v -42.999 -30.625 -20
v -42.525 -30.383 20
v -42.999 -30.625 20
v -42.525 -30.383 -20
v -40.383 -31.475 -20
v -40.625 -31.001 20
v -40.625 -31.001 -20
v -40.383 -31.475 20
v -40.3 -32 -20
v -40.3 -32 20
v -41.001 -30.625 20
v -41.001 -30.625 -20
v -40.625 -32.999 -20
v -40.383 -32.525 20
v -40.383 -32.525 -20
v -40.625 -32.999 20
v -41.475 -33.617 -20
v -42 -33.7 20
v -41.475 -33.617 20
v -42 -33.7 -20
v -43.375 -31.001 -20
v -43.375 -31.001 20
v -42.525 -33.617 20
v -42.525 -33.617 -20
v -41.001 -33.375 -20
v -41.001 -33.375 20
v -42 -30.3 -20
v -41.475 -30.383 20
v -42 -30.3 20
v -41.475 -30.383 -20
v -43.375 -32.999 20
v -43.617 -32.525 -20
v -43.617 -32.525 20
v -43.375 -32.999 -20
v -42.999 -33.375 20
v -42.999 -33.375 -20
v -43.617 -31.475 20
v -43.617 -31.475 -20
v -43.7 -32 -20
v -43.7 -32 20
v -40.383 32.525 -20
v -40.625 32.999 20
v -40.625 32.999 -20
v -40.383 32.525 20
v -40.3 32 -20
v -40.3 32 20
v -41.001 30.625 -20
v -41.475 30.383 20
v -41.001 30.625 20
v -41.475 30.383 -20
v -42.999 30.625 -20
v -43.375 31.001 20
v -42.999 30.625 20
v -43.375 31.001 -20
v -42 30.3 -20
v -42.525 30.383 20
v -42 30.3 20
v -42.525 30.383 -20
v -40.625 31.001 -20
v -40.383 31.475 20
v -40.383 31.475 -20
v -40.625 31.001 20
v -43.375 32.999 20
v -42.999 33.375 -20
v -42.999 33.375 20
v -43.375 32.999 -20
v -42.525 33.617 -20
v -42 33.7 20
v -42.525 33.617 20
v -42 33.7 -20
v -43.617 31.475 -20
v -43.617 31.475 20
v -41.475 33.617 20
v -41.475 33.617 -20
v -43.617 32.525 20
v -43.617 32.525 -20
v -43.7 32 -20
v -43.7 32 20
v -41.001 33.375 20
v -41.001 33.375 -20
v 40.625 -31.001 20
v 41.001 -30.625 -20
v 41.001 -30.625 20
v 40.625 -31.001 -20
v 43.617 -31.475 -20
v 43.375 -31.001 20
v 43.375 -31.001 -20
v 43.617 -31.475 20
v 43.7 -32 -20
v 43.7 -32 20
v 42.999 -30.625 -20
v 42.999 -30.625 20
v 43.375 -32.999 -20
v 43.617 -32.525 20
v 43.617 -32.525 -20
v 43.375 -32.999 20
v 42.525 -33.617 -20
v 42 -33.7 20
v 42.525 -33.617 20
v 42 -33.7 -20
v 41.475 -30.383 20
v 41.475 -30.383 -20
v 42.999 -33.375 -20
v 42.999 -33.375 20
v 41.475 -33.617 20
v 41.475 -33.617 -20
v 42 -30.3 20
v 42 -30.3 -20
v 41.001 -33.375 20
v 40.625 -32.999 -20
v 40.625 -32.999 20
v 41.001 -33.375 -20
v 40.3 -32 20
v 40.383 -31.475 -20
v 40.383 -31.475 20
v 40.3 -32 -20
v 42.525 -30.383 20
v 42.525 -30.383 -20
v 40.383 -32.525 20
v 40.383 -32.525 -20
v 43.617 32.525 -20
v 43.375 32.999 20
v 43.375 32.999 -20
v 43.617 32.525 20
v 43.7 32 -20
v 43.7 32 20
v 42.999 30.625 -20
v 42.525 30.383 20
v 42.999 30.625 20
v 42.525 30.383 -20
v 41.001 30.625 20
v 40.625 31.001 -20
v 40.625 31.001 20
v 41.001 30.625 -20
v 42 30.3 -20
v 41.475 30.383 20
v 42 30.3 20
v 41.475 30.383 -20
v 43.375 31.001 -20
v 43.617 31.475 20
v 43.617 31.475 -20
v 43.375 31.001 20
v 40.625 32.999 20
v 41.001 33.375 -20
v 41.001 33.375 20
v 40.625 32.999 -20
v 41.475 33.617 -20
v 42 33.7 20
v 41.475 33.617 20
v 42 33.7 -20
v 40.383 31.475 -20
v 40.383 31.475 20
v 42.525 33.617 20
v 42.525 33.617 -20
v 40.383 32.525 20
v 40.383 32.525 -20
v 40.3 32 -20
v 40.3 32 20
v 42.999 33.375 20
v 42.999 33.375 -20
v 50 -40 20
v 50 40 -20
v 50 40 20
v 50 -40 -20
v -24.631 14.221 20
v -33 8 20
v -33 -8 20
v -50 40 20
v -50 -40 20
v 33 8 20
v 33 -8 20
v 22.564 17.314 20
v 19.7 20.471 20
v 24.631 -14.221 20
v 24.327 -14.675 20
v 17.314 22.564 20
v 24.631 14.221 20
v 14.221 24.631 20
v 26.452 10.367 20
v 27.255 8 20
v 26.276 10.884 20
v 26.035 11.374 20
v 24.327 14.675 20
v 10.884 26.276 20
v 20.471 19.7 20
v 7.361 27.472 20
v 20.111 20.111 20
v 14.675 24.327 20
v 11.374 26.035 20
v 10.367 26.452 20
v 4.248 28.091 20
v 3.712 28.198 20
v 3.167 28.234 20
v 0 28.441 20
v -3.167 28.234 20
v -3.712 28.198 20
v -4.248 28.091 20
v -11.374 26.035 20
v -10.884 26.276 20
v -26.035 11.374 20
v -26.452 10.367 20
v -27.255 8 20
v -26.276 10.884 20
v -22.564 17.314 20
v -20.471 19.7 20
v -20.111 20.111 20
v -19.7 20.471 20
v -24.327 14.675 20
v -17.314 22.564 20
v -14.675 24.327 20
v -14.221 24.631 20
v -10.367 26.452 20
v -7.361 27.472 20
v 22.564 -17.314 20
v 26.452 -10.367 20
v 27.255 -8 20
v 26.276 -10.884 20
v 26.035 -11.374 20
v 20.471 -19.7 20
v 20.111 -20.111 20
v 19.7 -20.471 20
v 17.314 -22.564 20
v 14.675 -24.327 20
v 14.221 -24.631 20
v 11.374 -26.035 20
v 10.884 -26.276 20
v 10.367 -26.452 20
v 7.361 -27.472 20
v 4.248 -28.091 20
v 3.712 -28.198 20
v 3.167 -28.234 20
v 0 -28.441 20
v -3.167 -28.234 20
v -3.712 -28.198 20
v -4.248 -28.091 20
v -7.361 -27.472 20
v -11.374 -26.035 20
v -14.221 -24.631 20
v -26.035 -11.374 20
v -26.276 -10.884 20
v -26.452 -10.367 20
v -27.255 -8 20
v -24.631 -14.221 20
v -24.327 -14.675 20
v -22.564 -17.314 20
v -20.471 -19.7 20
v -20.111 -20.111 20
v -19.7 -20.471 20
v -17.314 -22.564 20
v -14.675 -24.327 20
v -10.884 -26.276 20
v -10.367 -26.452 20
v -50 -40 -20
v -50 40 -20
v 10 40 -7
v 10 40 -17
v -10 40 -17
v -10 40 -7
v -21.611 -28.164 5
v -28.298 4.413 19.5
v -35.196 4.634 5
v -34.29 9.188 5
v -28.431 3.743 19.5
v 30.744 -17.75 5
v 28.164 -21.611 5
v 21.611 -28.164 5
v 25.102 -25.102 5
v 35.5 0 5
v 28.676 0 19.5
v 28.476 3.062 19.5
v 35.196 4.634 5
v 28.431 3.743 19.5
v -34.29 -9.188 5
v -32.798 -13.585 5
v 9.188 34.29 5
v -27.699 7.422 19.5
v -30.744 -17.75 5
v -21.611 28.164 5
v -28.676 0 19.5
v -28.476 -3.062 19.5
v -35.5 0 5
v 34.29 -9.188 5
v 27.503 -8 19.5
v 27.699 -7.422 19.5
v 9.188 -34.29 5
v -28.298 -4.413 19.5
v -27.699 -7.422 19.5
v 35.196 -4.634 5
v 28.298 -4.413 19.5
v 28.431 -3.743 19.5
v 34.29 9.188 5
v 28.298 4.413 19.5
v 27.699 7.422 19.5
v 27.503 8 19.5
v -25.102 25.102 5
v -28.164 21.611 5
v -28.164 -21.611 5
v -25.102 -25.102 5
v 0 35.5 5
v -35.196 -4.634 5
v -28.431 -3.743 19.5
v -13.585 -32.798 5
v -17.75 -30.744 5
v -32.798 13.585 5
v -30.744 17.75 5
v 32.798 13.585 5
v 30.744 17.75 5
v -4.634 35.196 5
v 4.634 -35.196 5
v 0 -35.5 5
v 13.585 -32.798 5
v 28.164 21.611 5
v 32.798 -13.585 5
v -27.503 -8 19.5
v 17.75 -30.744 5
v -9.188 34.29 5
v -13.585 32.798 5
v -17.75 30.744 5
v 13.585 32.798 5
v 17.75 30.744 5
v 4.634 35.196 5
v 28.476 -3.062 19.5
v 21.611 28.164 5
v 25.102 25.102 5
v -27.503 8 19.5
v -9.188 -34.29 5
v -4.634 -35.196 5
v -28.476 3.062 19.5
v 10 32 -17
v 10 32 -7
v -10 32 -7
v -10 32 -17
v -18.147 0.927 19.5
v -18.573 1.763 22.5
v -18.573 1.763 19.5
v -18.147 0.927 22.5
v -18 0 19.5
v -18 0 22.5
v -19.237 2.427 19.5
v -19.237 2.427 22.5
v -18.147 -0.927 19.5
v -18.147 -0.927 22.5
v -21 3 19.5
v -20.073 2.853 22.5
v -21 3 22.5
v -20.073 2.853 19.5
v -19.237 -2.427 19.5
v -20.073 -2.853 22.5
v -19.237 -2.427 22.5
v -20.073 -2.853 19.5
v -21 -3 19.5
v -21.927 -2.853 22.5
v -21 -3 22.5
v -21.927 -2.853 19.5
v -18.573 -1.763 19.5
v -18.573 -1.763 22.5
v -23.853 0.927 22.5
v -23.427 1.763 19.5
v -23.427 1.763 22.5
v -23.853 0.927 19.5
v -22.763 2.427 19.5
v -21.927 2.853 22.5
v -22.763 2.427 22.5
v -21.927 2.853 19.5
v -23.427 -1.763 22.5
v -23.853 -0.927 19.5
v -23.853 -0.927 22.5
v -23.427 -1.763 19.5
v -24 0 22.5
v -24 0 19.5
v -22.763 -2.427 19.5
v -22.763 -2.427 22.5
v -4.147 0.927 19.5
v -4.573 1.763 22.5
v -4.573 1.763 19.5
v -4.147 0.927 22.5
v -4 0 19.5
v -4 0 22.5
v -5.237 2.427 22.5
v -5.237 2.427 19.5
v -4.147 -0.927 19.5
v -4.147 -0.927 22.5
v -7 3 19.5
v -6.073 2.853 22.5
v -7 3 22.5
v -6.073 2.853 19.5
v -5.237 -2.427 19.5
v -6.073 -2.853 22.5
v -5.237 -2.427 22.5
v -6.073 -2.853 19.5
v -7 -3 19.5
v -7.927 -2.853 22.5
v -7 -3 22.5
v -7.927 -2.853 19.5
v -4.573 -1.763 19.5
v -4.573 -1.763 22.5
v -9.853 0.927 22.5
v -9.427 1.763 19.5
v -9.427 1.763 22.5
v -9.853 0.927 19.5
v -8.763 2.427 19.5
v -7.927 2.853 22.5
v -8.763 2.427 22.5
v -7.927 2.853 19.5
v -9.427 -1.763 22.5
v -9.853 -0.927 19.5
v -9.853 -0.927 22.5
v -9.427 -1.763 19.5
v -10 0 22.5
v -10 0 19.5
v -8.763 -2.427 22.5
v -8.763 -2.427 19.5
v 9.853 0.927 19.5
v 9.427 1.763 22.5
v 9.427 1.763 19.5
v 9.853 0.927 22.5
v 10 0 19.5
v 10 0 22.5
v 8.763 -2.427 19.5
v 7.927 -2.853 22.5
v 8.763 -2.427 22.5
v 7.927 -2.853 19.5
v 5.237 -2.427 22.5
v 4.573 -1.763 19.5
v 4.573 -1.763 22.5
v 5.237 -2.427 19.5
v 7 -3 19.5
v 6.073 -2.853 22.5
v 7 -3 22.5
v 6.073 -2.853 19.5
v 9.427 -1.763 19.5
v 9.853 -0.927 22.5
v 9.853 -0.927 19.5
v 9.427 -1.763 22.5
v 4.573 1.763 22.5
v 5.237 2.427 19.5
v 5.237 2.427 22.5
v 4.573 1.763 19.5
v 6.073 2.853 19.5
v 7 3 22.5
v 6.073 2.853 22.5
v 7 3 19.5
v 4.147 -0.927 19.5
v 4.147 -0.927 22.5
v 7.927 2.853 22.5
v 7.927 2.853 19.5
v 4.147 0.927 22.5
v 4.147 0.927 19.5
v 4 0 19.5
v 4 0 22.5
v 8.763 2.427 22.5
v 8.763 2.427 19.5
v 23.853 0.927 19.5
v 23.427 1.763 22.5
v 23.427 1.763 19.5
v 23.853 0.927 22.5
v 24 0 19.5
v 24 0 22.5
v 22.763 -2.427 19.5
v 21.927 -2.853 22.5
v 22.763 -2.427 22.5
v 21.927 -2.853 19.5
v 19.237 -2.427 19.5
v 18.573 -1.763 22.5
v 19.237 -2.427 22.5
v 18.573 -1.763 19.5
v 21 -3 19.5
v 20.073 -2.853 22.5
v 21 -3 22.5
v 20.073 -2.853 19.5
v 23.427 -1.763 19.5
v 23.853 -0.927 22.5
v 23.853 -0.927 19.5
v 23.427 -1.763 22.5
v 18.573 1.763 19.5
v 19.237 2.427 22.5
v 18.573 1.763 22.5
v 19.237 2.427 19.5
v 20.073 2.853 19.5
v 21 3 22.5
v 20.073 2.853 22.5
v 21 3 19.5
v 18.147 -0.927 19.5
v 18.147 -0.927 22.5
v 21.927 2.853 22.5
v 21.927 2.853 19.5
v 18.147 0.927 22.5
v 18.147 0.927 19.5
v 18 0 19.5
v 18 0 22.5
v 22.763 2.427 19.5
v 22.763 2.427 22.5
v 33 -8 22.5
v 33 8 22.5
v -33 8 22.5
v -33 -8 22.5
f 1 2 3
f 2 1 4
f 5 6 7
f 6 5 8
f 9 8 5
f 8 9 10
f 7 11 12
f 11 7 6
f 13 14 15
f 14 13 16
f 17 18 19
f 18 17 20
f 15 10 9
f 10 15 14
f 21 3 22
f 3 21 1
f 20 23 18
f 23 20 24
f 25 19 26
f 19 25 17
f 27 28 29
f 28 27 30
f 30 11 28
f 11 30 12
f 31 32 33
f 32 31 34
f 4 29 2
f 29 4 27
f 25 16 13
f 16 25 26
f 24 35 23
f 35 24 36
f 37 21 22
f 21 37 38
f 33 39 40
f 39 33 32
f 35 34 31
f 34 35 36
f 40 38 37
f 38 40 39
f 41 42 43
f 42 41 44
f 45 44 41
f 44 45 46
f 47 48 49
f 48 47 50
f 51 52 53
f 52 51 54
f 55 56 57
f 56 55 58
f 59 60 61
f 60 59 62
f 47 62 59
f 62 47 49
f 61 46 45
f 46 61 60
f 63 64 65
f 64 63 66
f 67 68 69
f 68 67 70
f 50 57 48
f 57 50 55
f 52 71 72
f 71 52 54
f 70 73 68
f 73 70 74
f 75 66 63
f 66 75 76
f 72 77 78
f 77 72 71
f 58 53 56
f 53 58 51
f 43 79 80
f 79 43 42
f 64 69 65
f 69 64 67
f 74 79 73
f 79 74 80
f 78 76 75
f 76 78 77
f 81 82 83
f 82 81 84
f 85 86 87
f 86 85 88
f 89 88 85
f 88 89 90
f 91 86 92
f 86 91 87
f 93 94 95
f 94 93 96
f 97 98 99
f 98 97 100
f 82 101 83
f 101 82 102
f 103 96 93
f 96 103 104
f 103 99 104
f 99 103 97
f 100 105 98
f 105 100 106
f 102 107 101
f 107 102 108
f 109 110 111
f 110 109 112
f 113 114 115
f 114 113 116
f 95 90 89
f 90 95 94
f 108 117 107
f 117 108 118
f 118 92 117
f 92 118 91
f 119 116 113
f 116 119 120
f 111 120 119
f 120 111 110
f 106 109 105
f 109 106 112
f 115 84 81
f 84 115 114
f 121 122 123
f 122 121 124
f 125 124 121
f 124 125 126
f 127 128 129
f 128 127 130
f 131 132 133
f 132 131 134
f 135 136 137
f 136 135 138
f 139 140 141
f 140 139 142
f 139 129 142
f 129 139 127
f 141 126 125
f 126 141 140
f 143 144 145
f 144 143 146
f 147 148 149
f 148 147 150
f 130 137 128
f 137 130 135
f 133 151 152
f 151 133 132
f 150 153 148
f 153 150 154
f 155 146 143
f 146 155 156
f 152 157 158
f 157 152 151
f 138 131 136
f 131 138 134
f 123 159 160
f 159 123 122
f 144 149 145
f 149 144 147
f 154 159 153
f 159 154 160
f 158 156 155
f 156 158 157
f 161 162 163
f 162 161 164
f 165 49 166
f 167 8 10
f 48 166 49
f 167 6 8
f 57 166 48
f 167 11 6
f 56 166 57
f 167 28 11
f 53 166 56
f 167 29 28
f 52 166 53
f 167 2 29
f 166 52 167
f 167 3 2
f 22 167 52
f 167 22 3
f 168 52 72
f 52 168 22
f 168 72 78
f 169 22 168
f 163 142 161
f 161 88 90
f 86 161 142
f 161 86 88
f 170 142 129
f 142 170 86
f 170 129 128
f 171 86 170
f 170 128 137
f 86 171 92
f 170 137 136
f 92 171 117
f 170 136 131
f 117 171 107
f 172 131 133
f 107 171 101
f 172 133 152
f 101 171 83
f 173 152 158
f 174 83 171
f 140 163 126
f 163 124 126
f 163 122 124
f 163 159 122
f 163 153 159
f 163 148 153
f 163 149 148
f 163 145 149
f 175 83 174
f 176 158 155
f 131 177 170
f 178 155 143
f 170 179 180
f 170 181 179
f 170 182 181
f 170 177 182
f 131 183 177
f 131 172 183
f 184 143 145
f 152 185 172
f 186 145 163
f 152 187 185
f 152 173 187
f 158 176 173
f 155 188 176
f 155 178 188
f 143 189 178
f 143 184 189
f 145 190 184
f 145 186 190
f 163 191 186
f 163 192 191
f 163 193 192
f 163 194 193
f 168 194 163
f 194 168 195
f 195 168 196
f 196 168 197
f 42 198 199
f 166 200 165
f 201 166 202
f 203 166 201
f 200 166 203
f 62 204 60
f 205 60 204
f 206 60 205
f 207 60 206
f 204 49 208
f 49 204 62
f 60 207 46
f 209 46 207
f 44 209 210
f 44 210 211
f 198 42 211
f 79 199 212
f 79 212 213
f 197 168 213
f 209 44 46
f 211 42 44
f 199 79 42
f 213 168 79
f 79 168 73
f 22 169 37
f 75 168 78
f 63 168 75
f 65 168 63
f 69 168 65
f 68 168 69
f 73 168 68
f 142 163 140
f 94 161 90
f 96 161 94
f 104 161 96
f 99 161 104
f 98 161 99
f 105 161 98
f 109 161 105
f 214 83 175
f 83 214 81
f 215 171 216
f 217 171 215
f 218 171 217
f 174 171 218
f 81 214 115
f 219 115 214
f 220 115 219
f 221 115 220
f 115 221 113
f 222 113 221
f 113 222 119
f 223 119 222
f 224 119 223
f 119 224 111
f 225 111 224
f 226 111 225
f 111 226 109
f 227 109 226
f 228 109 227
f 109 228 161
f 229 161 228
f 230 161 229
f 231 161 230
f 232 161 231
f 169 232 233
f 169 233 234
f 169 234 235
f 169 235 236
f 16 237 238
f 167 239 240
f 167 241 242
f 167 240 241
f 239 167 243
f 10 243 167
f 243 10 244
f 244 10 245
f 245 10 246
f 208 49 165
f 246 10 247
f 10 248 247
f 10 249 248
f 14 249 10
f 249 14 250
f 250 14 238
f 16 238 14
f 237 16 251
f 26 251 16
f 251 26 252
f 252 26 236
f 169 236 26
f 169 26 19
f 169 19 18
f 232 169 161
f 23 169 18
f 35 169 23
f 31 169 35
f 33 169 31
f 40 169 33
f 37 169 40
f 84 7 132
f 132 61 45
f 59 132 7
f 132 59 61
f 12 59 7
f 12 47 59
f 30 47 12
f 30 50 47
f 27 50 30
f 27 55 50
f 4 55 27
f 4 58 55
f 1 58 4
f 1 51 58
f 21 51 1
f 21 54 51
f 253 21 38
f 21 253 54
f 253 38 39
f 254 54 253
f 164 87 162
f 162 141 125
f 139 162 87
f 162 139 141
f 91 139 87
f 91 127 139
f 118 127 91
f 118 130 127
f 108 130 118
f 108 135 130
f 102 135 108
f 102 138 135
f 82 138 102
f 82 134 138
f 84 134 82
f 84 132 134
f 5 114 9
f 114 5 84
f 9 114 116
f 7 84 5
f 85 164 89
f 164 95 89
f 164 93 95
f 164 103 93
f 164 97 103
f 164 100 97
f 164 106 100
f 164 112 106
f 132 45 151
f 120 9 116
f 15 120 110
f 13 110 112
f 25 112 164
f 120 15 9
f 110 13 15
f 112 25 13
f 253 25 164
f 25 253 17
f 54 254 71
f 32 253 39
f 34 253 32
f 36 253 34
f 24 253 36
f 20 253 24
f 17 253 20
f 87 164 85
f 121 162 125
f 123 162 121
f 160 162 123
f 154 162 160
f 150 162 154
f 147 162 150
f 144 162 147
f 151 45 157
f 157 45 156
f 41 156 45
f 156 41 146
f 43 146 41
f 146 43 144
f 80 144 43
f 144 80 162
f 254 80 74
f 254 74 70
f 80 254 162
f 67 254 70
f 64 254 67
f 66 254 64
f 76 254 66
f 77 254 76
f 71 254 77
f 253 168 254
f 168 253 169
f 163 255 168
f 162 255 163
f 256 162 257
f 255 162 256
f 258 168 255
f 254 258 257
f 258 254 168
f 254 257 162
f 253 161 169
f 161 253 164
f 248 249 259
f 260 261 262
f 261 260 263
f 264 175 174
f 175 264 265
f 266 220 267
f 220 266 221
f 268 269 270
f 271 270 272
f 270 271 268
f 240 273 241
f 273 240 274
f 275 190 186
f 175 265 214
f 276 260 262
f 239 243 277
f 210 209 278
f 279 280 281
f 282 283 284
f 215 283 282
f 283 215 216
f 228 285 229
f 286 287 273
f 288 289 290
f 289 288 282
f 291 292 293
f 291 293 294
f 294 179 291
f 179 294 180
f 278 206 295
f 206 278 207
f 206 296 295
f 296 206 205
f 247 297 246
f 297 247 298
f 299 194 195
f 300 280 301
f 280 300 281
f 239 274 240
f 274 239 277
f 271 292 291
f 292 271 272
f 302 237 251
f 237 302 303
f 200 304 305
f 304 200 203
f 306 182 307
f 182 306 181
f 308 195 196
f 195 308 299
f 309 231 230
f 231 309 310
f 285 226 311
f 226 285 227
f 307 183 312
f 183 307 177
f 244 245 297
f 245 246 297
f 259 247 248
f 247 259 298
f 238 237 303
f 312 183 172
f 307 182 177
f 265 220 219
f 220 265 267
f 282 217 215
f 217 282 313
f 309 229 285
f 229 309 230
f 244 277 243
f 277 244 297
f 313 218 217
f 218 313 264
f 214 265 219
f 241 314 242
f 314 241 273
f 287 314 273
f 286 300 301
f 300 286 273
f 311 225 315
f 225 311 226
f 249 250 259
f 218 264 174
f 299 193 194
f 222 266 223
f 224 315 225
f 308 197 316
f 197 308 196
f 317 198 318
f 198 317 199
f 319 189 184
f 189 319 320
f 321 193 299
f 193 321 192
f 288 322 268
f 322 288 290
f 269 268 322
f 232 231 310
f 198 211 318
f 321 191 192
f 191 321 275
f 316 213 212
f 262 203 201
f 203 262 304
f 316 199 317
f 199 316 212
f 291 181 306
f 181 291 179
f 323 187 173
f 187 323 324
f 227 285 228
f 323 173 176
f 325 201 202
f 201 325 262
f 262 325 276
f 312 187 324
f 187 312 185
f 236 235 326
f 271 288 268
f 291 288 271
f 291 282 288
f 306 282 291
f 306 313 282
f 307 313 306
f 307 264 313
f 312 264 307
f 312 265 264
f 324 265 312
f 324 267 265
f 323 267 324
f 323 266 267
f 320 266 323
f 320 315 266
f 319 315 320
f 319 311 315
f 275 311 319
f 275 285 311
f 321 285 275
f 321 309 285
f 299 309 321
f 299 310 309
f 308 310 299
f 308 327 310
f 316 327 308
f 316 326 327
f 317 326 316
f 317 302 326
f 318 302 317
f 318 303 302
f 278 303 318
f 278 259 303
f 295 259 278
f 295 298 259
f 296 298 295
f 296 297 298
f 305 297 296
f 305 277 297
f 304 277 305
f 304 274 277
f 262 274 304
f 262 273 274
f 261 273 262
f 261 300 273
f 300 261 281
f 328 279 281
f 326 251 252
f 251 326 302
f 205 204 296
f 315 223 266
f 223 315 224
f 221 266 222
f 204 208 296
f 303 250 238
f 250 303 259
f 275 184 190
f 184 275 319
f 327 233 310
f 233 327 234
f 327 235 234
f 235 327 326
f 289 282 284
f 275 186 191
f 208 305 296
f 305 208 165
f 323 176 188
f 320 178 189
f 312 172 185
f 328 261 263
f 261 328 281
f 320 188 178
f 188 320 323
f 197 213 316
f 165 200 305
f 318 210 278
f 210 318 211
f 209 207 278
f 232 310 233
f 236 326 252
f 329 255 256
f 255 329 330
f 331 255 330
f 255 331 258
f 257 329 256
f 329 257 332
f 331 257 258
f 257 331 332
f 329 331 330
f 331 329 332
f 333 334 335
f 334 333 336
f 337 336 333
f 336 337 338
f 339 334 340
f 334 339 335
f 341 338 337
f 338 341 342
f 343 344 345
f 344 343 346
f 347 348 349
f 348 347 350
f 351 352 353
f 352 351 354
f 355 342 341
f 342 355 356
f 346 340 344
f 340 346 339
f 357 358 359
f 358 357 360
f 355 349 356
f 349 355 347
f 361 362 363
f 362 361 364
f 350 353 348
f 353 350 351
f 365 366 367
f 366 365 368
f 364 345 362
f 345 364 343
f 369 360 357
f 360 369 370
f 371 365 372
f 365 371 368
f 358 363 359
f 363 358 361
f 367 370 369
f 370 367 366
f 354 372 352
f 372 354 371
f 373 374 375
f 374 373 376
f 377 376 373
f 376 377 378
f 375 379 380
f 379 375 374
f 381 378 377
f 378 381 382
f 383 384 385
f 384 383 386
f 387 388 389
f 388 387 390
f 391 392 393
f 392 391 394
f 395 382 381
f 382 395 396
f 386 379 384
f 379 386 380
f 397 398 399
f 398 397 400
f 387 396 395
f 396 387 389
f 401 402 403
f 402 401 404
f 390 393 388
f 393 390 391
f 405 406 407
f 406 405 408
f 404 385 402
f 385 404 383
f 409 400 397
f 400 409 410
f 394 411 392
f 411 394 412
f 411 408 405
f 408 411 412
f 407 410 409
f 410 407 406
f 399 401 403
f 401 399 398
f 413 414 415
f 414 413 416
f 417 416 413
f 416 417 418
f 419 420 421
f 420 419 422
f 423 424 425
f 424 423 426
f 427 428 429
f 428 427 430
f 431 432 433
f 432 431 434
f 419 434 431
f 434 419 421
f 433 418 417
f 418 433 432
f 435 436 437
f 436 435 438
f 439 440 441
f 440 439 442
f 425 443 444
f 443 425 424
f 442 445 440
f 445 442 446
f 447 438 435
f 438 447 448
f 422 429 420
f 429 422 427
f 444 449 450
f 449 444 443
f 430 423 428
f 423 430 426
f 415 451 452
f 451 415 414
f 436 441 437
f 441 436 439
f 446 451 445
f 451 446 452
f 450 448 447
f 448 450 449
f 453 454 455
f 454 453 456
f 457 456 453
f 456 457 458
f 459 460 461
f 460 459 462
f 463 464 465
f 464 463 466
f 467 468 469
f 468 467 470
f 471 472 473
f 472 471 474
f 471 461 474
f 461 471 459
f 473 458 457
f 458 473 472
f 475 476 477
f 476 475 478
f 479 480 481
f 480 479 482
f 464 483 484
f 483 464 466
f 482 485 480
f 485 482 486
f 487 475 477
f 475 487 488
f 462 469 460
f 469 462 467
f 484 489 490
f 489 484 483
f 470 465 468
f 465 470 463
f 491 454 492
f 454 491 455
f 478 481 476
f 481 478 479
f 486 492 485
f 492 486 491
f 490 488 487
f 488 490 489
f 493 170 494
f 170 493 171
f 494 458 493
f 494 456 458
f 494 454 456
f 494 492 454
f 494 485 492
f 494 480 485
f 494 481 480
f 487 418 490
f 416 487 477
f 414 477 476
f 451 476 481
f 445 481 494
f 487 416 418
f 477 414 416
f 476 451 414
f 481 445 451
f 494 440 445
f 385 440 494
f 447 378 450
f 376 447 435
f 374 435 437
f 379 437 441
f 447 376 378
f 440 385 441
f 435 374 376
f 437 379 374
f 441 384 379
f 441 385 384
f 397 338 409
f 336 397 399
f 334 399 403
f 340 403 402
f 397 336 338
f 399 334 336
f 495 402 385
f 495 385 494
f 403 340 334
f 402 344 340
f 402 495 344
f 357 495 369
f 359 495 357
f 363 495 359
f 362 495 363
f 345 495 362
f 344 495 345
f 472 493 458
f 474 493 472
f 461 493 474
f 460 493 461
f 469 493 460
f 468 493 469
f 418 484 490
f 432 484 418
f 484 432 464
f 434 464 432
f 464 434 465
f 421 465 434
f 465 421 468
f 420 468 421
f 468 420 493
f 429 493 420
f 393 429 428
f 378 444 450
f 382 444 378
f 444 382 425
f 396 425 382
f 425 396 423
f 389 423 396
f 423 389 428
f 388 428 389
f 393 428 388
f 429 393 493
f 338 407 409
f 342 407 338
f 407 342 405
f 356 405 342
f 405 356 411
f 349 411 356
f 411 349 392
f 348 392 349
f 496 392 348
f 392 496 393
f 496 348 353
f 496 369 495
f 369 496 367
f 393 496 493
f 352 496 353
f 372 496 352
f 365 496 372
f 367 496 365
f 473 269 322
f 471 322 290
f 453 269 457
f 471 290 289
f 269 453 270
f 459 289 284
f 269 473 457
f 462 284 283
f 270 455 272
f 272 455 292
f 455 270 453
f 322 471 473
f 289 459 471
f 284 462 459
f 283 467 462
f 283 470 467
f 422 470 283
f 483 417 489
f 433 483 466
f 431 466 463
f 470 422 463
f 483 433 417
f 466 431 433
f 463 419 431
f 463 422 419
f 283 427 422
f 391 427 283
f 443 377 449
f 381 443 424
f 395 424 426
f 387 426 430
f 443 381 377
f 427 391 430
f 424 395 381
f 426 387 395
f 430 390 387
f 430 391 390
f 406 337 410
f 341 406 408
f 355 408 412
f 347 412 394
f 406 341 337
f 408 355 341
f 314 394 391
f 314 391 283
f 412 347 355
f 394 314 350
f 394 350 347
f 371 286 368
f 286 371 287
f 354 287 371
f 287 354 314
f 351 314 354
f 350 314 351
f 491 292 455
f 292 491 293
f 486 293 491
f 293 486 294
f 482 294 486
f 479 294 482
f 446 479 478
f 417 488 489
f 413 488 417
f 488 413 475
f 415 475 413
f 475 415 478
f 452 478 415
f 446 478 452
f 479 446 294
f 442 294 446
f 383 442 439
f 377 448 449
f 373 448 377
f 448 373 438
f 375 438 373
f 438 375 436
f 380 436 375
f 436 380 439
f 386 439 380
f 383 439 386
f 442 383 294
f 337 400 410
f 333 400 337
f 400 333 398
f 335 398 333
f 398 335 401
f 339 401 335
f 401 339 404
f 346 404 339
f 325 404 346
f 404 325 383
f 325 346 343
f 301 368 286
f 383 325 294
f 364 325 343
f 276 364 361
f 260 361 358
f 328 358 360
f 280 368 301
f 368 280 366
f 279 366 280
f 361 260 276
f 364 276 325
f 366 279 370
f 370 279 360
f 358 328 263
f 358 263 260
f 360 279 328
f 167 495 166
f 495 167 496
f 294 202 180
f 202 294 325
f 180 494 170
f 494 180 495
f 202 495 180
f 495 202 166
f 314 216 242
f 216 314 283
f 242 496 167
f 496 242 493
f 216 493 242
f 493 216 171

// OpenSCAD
// Parametric charging station for the MyZubster modular robot.
// Provides a dock pad with spring-loaded charging contacts for the
// auto-recharge system described in issue #85.
// Print in PETG, 50% infill. Contacts are pogo pins (P75-B2 or similar).

// Parameters (mm)
station_l = 100;
station_w = 80;
station_h = 40;
contact_dia = 4;
contact_count = 4;
contact_spacing = 14;
guide_dia = 55;
guide_depth = 15;
bolt_dia = 3.4;
wall = 4;
$fn = 48;

module charging_station() {
  difference() {
    // main body
    cube([station_l, station_w, station_h], center = true);

    // robot guide funnel (cone) lets the robot self-align
    translate([0, 0, station_h / 2 - guide_depth / 2 + 1])
      cylinder(h = guide_depth + 2, d1 = guide_dia + 16, d2 = guide_dia, center = true);

    // charging contact holes
    for (i = [0 : contact_count - 1])
      translate([(i - (contact_count - 1) / 2) * contact_spacing, 0, station_h / 2 - 4])
        cylinder(h = 10, d = contact_dia, $fn = 20, center = true);

    // cable passthrough
    translate([0, station_w / 2 - wall, -station_h / 2 + 8])
      cube([20, wall * 2, 10], center = true);

    // corner mount bolts
    for (sx = [-1, 1], sy = [-1, 1])
      translate([sx * (station_l / 2 - 8), sy * (station_w / 2 - 8), 0])
        cylinder(h = station_h + 2, d = bolt_dia, $fn = 20, center = true);
  }
  // contact pad (raised surface where pogo pins touch)
  translate([0, 0, station_h / 2 + 1])
    difference() {
      cube([contact_count * contact_spacing + 10, 16, 3], center = true);
      for (i = [0 : contact_count - 1])
        translate([(i - (contact_count - 1) / 2) * contact_spacing, 0, 0])
          cylinder(h = 4, d = contact_dia + 2, $fn = 20, center = true);
    }
}

charging_station();
